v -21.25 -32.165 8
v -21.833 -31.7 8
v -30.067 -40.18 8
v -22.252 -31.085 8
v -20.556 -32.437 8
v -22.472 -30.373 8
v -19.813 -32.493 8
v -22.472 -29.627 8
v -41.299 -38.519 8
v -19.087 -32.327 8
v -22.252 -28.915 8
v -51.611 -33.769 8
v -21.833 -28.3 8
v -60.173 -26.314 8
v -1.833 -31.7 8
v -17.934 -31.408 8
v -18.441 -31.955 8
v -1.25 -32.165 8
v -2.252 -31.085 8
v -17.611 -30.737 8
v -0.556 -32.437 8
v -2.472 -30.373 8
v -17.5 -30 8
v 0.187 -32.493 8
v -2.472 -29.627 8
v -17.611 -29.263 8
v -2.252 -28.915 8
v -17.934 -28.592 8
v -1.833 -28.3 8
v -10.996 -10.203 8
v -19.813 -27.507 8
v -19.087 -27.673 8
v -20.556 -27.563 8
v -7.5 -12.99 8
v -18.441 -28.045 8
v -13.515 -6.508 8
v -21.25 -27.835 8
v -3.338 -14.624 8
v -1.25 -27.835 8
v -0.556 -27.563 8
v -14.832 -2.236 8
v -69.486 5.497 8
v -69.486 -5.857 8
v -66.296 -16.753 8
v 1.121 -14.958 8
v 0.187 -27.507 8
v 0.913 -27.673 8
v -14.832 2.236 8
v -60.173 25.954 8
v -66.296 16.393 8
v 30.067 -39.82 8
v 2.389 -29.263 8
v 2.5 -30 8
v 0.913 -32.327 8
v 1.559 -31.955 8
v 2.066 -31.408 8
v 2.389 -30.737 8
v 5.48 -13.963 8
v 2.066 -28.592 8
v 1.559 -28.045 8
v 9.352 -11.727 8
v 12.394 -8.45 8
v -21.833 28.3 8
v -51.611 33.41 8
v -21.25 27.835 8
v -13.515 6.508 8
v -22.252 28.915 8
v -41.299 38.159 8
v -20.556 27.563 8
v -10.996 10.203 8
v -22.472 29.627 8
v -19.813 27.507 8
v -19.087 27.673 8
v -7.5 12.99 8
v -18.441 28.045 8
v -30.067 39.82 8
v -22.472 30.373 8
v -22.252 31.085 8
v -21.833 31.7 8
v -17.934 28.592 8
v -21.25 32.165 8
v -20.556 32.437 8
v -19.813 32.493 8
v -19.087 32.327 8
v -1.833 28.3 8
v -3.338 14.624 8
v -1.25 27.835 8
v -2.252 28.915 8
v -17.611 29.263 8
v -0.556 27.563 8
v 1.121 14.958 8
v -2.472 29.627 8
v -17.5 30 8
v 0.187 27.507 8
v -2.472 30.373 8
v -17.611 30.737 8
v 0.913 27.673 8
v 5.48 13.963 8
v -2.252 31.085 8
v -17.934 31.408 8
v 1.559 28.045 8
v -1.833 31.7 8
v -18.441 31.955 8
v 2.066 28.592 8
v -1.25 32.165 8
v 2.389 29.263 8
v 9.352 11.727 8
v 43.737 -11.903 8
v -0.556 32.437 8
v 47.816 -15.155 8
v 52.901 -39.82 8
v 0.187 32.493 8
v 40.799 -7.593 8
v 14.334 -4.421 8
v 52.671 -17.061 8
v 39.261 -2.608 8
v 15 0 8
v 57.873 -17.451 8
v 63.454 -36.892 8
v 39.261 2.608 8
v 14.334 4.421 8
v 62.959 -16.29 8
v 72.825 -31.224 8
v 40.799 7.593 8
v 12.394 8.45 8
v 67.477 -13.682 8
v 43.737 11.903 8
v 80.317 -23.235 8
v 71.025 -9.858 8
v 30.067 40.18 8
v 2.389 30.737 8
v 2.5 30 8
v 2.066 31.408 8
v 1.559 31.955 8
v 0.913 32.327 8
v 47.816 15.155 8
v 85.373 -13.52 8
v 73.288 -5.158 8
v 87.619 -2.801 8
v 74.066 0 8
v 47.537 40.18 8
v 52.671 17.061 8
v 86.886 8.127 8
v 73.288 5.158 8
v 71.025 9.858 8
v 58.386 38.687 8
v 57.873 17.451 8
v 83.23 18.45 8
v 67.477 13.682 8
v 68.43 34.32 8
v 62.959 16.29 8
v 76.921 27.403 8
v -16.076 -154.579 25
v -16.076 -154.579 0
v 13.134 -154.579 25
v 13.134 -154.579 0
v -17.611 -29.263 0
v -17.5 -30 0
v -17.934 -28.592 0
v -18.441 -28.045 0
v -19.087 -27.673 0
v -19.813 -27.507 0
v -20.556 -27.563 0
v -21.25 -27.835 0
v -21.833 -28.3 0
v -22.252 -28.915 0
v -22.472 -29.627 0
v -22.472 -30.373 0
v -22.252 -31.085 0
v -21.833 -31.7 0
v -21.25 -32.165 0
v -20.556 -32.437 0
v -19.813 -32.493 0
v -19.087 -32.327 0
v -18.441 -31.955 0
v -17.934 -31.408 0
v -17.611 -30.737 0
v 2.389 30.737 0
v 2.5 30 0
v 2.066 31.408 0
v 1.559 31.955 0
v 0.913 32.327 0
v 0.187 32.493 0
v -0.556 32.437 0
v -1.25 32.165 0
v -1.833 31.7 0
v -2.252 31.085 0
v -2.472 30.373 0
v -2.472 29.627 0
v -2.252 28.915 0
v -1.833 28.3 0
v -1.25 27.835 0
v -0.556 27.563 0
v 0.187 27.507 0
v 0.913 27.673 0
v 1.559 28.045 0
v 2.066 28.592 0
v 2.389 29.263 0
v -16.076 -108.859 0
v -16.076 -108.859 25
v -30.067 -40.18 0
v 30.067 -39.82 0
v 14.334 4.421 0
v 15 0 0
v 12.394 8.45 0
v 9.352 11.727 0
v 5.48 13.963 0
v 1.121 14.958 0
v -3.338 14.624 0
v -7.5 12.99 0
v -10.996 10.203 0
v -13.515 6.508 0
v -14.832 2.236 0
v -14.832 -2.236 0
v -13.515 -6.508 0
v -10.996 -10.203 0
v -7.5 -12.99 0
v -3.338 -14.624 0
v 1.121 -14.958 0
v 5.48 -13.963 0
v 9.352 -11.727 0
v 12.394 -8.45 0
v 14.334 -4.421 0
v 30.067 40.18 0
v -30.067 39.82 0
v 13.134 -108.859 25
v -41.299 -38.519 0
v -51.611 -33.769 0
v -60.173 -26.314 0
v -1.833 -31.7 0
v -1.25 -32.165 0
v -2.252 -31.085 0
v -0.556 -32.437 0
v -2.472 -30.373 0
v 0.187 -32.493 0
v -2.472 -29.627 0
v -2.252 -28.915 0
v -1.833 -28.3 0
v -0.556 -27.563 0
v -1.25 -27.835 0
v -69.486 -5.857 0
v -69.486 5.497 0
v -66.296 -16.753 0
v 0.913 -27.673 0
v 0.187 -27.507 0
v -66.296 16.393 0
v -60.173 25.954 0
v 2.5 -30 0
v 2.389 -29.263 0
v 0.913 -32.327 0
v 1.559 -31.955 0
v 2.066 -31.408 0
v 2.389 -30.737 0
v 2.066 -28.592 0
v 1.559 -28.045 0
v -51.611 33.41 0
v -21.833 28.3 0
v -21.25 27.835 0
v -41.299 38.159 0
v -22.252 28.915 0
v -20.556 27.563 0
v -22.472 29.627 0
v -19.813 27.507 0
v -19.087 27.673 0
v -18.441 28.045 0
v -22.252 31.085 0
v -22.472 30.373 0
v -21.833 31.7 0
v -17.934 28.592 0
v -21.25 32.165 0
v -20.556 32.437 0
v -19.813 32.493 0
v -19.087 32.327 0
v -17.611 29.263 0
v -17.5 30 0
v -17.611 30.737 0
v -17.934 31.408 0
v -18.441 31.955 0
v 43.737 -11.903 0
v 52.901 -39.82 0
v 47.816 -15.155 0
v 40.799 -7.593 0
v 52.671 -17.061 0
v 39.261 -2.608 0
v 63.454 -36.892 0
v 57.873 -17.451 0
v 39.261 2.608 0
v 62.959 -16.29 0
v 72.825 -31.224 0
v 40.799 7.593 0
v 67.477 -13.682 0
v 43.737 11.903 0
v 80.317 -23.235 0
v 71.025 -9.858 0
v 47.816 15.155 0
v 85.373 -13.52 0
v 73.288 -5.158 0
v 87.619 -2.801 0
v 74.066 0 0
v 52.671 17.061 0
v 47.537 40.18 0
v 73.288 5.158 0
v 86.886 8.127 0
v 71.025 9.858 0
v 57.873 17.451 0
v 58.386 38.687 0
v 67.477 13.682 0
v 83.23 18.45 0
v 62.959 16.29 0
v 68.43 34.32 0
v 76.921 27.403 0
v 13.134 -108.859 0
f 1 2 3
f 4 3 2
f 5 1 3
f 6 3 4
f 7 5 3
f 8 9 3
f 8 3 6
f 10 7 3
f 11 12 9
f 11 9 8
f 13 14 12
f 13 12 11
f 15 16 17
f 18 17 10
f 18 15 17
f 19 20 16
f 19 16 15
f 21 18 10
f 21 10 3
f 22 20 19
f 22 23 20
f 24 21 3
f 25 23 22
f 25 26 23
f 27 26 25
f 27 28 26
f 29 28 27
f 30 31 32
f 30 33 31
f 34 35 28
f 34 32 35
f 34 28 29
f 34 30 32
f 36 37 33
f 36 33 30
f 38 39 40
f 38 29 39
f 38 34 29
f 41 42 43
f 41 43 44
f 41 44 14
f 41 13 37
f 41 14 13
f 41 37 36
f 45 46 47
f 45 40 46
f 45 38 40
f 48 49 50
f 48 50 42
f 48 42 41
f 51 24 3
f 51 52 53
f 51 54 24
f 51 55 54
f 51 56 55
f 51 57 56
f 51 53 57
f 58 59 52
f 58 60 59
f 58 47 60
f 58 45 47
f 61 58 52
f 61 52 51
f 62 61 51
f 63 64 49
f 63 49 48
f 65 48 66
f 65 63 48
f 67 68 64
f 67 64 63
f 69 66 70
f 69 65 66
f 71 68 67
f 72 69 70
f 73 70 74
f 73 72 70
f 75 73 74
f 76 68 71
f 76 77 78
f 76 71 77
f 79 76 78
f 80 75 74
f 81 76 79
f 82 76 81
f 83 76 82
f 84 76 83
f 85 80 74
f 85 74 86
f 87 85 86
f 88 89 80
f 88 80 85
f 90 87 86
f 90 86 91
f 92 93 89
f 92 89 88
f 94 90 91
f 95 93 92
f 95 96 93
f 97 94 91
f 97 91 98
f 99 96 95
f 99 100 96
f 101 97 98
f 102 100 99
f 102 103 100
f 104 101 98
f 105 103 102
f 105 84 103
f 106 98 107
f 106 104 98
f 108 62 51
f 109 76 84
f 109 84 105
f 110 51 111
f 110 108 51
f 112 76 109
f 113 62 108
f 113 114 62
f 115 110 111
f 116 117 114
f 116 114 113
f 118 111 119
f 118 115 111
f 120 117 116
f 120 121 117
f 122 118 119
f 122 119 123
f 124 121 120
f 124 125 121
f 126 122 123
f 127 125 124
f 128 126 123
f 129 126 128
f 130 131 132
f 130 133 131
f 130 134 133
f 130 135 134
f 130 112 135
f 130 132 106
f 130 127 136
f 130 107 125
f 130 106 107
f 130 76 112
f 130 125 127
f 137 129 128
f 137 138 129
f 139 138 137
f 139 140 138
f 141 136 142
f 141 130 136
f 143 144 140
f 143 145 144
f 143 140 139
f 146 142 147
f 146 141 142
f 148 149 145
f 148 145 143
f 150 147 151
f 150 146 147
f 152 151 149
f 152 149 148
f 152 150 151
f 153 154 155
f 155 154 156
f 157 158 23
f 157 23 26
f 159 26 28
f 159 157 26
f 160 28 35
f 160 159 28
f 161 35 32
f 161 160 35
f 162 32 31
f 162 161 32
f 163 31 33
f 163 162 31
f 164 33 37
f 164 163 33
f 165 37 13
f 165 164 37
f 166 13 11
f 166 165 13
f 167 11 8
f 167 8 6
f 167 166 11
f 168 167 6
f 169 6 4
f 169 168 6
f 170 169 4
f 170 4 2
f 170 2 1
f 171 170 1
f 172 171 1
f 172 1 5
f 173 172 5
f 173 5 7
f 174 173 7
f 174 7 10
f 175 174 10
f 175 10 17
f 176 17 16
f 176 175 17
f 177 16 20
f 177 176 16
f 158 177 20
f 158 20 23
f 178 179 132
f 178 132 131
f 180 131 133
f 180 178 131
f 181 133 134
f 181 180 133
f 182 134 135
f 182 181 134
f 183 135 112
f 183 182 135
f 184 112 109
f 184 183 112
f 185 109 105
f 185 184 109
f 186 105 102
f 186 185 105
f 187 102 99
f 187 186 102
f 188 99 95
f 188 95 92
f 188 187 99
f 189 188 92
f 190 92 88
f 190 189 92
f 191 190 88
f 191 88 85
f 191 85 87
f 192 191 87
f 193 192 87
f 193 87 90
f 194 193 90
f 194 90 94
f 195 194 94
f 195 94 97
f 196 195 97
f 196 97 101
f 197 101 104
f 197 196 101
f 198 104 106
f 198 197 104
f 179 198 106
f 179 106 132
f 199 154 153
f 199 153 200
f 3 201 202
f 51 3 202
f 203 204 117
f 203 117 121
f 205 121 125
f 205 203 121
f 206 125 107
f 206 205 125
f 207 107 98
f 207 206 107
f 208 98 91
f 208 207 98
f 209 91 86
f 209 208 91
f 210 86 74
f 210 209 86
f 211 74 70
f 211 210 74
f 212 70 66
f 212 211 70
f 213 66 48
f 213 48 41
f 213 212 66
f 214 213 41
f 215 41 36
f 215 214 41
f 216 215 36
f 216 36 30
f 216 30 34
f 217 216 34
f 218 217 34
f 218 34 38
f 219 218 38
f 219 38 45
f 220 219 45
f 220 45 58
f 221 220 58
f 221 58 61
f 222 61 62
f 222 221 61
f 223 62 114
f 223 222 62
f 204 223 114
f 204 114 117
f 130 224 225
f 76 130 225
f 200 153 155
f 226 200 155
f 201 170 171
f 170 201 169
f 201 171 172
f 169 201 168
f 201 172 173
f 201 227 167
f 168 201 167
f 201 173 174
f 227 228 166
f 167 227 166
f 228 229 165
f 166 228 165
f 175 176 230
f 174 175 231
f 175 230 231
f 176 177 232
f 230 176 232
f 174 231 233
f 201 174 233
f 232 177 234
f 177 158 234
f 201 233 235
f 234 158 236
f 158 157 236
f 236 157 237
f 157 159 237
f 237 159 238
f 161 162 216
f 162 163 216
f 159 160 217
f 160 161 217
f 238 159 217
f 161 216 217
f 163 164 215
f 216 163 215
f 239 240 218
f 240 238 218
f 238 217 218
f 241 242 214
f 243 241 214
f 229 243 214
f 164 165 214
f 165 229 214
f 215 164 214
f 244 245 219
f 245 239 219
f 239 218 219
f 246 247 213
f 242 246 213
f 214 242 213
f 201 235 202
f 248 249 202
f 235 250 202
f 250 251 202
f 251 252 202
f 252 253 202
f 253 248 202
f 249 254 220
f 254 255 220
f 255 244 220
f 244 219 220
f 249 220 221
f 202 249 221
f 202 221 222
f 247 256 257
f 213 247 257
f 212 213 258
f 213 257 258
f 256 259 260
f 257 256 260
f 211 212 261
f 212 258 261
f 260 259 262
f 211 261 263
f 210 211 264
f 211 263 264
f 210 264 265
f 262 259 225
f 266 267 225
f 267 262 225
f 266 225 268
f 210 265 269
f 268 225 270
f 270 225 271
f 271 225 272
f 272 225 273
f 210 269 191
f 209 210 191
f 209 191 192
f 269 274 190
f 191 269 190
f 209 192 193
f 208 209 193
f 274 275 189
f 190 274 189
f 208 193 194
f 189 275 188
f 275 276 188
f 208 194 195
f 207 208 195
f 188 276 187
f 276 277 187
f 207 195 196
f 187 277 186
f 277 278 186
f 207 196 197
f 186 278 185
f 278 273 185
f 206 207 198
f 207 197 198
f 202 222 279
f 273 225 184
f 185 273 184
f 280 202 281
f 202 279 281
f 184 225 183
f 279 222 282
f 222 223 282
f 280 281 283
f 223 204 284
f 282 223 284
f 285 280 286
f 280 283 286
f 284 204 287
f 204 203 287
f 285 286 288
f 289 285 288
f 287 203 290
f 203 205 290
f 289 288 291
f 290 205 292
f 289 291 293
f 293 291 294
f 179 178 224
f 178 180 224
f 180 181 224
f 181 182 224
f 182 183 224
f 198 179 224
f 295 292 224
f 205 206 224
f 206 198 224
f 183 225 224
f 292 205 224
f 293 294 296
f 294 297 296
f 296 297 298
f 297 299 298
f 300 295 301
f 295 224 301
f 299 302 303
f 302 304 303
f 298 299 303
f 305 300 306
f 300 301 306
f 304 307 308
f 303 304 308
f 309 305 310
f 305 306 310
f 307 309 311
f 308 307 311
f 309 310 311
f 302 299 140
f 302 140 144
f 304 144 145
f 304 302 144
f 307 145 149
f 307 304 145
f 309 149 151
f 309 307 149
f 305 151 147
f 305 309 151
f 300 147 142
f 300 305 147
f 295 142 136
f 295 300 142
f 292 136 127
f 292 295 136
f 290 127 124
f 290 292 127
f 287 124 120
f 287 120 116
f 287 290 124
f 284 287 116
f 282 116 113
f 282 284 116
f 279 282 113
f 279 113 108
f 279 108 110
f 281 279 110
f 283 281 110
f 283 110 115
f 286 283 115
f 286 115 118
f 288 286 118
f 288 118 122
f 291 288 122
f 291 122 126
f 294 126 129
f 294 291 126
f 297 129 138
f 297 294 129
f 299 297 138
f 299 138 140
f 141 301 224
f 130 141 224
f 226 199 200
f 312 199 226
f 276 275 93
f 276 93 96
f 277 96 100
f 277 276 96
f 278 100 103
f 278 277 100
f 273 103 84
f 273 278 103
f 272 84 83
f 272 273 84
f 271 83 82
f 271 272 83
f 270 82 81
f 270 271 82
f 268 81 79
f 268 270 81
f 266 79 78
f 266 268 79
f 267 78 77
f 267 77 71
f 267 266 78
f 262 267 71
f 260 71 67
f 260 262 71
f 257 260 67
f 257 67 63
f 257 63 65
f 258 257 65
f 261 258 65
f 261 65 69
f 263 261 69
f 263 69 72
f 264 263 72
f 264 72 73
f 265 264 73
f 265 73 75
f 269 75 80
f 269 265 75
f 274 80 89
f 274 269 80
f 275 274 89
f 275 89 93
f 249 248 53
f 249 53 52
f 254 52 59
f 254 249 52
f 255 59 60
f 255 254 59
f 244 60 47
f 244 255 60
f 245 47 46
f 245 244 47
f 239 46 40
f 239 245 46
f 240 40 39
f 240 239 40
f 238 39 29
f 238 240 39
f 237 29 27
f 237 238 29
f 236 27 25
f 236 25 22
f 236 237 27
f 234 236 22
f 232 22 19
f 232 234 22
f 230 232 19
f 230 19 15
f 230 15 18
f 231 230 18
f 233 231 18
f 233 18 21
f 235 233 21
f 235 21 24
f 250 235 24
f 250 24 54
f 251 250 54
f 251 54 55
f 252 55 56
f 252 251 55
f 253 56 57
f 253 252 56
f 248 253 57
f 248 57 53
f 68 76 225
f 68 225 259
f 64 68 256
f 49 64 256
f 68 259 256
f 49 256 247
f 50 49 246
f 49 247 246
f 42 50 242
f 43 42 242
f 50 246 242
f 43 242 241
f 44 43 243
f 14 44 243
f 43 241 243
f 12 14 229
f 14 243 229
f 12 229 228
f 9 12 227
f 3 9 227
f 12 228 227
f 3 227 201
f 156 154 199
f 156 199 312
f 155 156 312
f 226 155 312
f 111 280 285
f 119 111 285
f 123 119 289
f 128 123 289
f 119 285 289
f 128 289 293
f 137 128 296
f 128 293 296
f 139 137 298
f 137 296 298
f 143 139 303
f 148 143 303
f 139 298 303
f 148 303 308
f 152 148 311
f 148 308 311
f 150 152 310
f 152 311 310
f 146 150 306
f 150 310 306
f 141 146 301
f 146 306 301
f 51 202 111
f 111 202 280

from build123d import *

# Parameters (mm, degrees)
F0_R     = 2.5
F0_R_2   = 15
F0_R_3   = 17.5
F1_DEPTH = 8
F2_W     = 29.21
F2_H     = 45.72
F3_DEPTH = 25


with BuildPart() as f1:
    # F0 (on Top) → F1 (new body)
    with BuildSketch(Plane.XY):
        with BuildLine():
            Line((47.5365072489, 40.1798446656), (30.0673510397, 40.1798446656))
            Line((30.0673510397, 40.1798446656), (-30.0673510397, 39.8201553344))
            ThreePointArc((-30.0673510397, 39.8201553344), (-69.8908630641, -0.1798446656), (-30.0673510397, -40.1798446656))
            Line((-30.0673510397, -40.1798446656), (30.0673510397, -39.8201553344))
            Line((30.0673510397, -39.8201553344), (52.9007543066, -39.8201553344))
            ThreePointArc((52.9007543066, -39.8201553344), (87.6263287329, 2.6881463368), (47.5365072489, 40.1798446656))
        make_face()
        with BuildLine():
            Line((-30.158165083, 34.819522698), (30.0823043903, 35.1798446656))
            Line((30.0823043903, 35.1798446656), (47.5365072489, 35.1798446656))
            ThreePointArc((47.5365072489, 35.1798446656), (82.7163519145, 0), (47.5365072489, -35.1798446656))
            Line((47.5365072489, -35.1798446656), (-29.8931489636, -35.1802356388))
            ThreePointArc((-29.8931489636, -35.1802356388), (-64.8906122282, -0.3123537137), (-30.158165083, 34.819522698))
        make_face(mode=Mode.SUBTRACT)
        with BuildLine():
            Line((47.5365072489, 35.1798446656), (30.0823043903, 35.1798446656))
            Line((30.0823043903, 35.1798446656), (-30.158165083, 34.819522698))
            ThreePointArc((-30.158165083, 34.819522698), (-64.8906122282, -0.3123537137), (-29.8931489636, -35.1802356388))
            Line((-29.8931489636, -35.1802356388), (47.5365072489, -35.1798446656))
            ThreePointArc((47.5365072489, -35.1798446656), (82.7163519145, 0), (47.5365072489, 35.1798446656))
        make_face()
        with Locations((-20, -30)):
            Circle(F0_R, mode=Mode.SUBTRACT)
        with Locations((0, -30)):
            Circle(F0_R, mode=Mode.SUBTRACT)
        Circle(F0_R_2, mode=Mode.SUBTRACT)
        with Locations((56.5655827522, 0)):
            Circle(F0_R_3, mode=Mode.SUBTRACT)
        with Locations((-20, 30)):
            Circle(F0_R, mode=Mode.SUBTRACT)
        with Locations((0, 30)):
            Circle(F0_R, mode=Mode.SUBTRACT)
    extrude(amount=F1_DEPTH)


with BuildPart() as f3:
    # F2 (on Top) → F3 (new body)
    with BuildSketch(Plane.XY):
        with Locations((-1.4707511291, -131.7193172872)):
            Rectangle(F2_W, F2_H)
    extrude(amount=F3_DEPTH)


solid = Compound([f1.part, f3.part])
